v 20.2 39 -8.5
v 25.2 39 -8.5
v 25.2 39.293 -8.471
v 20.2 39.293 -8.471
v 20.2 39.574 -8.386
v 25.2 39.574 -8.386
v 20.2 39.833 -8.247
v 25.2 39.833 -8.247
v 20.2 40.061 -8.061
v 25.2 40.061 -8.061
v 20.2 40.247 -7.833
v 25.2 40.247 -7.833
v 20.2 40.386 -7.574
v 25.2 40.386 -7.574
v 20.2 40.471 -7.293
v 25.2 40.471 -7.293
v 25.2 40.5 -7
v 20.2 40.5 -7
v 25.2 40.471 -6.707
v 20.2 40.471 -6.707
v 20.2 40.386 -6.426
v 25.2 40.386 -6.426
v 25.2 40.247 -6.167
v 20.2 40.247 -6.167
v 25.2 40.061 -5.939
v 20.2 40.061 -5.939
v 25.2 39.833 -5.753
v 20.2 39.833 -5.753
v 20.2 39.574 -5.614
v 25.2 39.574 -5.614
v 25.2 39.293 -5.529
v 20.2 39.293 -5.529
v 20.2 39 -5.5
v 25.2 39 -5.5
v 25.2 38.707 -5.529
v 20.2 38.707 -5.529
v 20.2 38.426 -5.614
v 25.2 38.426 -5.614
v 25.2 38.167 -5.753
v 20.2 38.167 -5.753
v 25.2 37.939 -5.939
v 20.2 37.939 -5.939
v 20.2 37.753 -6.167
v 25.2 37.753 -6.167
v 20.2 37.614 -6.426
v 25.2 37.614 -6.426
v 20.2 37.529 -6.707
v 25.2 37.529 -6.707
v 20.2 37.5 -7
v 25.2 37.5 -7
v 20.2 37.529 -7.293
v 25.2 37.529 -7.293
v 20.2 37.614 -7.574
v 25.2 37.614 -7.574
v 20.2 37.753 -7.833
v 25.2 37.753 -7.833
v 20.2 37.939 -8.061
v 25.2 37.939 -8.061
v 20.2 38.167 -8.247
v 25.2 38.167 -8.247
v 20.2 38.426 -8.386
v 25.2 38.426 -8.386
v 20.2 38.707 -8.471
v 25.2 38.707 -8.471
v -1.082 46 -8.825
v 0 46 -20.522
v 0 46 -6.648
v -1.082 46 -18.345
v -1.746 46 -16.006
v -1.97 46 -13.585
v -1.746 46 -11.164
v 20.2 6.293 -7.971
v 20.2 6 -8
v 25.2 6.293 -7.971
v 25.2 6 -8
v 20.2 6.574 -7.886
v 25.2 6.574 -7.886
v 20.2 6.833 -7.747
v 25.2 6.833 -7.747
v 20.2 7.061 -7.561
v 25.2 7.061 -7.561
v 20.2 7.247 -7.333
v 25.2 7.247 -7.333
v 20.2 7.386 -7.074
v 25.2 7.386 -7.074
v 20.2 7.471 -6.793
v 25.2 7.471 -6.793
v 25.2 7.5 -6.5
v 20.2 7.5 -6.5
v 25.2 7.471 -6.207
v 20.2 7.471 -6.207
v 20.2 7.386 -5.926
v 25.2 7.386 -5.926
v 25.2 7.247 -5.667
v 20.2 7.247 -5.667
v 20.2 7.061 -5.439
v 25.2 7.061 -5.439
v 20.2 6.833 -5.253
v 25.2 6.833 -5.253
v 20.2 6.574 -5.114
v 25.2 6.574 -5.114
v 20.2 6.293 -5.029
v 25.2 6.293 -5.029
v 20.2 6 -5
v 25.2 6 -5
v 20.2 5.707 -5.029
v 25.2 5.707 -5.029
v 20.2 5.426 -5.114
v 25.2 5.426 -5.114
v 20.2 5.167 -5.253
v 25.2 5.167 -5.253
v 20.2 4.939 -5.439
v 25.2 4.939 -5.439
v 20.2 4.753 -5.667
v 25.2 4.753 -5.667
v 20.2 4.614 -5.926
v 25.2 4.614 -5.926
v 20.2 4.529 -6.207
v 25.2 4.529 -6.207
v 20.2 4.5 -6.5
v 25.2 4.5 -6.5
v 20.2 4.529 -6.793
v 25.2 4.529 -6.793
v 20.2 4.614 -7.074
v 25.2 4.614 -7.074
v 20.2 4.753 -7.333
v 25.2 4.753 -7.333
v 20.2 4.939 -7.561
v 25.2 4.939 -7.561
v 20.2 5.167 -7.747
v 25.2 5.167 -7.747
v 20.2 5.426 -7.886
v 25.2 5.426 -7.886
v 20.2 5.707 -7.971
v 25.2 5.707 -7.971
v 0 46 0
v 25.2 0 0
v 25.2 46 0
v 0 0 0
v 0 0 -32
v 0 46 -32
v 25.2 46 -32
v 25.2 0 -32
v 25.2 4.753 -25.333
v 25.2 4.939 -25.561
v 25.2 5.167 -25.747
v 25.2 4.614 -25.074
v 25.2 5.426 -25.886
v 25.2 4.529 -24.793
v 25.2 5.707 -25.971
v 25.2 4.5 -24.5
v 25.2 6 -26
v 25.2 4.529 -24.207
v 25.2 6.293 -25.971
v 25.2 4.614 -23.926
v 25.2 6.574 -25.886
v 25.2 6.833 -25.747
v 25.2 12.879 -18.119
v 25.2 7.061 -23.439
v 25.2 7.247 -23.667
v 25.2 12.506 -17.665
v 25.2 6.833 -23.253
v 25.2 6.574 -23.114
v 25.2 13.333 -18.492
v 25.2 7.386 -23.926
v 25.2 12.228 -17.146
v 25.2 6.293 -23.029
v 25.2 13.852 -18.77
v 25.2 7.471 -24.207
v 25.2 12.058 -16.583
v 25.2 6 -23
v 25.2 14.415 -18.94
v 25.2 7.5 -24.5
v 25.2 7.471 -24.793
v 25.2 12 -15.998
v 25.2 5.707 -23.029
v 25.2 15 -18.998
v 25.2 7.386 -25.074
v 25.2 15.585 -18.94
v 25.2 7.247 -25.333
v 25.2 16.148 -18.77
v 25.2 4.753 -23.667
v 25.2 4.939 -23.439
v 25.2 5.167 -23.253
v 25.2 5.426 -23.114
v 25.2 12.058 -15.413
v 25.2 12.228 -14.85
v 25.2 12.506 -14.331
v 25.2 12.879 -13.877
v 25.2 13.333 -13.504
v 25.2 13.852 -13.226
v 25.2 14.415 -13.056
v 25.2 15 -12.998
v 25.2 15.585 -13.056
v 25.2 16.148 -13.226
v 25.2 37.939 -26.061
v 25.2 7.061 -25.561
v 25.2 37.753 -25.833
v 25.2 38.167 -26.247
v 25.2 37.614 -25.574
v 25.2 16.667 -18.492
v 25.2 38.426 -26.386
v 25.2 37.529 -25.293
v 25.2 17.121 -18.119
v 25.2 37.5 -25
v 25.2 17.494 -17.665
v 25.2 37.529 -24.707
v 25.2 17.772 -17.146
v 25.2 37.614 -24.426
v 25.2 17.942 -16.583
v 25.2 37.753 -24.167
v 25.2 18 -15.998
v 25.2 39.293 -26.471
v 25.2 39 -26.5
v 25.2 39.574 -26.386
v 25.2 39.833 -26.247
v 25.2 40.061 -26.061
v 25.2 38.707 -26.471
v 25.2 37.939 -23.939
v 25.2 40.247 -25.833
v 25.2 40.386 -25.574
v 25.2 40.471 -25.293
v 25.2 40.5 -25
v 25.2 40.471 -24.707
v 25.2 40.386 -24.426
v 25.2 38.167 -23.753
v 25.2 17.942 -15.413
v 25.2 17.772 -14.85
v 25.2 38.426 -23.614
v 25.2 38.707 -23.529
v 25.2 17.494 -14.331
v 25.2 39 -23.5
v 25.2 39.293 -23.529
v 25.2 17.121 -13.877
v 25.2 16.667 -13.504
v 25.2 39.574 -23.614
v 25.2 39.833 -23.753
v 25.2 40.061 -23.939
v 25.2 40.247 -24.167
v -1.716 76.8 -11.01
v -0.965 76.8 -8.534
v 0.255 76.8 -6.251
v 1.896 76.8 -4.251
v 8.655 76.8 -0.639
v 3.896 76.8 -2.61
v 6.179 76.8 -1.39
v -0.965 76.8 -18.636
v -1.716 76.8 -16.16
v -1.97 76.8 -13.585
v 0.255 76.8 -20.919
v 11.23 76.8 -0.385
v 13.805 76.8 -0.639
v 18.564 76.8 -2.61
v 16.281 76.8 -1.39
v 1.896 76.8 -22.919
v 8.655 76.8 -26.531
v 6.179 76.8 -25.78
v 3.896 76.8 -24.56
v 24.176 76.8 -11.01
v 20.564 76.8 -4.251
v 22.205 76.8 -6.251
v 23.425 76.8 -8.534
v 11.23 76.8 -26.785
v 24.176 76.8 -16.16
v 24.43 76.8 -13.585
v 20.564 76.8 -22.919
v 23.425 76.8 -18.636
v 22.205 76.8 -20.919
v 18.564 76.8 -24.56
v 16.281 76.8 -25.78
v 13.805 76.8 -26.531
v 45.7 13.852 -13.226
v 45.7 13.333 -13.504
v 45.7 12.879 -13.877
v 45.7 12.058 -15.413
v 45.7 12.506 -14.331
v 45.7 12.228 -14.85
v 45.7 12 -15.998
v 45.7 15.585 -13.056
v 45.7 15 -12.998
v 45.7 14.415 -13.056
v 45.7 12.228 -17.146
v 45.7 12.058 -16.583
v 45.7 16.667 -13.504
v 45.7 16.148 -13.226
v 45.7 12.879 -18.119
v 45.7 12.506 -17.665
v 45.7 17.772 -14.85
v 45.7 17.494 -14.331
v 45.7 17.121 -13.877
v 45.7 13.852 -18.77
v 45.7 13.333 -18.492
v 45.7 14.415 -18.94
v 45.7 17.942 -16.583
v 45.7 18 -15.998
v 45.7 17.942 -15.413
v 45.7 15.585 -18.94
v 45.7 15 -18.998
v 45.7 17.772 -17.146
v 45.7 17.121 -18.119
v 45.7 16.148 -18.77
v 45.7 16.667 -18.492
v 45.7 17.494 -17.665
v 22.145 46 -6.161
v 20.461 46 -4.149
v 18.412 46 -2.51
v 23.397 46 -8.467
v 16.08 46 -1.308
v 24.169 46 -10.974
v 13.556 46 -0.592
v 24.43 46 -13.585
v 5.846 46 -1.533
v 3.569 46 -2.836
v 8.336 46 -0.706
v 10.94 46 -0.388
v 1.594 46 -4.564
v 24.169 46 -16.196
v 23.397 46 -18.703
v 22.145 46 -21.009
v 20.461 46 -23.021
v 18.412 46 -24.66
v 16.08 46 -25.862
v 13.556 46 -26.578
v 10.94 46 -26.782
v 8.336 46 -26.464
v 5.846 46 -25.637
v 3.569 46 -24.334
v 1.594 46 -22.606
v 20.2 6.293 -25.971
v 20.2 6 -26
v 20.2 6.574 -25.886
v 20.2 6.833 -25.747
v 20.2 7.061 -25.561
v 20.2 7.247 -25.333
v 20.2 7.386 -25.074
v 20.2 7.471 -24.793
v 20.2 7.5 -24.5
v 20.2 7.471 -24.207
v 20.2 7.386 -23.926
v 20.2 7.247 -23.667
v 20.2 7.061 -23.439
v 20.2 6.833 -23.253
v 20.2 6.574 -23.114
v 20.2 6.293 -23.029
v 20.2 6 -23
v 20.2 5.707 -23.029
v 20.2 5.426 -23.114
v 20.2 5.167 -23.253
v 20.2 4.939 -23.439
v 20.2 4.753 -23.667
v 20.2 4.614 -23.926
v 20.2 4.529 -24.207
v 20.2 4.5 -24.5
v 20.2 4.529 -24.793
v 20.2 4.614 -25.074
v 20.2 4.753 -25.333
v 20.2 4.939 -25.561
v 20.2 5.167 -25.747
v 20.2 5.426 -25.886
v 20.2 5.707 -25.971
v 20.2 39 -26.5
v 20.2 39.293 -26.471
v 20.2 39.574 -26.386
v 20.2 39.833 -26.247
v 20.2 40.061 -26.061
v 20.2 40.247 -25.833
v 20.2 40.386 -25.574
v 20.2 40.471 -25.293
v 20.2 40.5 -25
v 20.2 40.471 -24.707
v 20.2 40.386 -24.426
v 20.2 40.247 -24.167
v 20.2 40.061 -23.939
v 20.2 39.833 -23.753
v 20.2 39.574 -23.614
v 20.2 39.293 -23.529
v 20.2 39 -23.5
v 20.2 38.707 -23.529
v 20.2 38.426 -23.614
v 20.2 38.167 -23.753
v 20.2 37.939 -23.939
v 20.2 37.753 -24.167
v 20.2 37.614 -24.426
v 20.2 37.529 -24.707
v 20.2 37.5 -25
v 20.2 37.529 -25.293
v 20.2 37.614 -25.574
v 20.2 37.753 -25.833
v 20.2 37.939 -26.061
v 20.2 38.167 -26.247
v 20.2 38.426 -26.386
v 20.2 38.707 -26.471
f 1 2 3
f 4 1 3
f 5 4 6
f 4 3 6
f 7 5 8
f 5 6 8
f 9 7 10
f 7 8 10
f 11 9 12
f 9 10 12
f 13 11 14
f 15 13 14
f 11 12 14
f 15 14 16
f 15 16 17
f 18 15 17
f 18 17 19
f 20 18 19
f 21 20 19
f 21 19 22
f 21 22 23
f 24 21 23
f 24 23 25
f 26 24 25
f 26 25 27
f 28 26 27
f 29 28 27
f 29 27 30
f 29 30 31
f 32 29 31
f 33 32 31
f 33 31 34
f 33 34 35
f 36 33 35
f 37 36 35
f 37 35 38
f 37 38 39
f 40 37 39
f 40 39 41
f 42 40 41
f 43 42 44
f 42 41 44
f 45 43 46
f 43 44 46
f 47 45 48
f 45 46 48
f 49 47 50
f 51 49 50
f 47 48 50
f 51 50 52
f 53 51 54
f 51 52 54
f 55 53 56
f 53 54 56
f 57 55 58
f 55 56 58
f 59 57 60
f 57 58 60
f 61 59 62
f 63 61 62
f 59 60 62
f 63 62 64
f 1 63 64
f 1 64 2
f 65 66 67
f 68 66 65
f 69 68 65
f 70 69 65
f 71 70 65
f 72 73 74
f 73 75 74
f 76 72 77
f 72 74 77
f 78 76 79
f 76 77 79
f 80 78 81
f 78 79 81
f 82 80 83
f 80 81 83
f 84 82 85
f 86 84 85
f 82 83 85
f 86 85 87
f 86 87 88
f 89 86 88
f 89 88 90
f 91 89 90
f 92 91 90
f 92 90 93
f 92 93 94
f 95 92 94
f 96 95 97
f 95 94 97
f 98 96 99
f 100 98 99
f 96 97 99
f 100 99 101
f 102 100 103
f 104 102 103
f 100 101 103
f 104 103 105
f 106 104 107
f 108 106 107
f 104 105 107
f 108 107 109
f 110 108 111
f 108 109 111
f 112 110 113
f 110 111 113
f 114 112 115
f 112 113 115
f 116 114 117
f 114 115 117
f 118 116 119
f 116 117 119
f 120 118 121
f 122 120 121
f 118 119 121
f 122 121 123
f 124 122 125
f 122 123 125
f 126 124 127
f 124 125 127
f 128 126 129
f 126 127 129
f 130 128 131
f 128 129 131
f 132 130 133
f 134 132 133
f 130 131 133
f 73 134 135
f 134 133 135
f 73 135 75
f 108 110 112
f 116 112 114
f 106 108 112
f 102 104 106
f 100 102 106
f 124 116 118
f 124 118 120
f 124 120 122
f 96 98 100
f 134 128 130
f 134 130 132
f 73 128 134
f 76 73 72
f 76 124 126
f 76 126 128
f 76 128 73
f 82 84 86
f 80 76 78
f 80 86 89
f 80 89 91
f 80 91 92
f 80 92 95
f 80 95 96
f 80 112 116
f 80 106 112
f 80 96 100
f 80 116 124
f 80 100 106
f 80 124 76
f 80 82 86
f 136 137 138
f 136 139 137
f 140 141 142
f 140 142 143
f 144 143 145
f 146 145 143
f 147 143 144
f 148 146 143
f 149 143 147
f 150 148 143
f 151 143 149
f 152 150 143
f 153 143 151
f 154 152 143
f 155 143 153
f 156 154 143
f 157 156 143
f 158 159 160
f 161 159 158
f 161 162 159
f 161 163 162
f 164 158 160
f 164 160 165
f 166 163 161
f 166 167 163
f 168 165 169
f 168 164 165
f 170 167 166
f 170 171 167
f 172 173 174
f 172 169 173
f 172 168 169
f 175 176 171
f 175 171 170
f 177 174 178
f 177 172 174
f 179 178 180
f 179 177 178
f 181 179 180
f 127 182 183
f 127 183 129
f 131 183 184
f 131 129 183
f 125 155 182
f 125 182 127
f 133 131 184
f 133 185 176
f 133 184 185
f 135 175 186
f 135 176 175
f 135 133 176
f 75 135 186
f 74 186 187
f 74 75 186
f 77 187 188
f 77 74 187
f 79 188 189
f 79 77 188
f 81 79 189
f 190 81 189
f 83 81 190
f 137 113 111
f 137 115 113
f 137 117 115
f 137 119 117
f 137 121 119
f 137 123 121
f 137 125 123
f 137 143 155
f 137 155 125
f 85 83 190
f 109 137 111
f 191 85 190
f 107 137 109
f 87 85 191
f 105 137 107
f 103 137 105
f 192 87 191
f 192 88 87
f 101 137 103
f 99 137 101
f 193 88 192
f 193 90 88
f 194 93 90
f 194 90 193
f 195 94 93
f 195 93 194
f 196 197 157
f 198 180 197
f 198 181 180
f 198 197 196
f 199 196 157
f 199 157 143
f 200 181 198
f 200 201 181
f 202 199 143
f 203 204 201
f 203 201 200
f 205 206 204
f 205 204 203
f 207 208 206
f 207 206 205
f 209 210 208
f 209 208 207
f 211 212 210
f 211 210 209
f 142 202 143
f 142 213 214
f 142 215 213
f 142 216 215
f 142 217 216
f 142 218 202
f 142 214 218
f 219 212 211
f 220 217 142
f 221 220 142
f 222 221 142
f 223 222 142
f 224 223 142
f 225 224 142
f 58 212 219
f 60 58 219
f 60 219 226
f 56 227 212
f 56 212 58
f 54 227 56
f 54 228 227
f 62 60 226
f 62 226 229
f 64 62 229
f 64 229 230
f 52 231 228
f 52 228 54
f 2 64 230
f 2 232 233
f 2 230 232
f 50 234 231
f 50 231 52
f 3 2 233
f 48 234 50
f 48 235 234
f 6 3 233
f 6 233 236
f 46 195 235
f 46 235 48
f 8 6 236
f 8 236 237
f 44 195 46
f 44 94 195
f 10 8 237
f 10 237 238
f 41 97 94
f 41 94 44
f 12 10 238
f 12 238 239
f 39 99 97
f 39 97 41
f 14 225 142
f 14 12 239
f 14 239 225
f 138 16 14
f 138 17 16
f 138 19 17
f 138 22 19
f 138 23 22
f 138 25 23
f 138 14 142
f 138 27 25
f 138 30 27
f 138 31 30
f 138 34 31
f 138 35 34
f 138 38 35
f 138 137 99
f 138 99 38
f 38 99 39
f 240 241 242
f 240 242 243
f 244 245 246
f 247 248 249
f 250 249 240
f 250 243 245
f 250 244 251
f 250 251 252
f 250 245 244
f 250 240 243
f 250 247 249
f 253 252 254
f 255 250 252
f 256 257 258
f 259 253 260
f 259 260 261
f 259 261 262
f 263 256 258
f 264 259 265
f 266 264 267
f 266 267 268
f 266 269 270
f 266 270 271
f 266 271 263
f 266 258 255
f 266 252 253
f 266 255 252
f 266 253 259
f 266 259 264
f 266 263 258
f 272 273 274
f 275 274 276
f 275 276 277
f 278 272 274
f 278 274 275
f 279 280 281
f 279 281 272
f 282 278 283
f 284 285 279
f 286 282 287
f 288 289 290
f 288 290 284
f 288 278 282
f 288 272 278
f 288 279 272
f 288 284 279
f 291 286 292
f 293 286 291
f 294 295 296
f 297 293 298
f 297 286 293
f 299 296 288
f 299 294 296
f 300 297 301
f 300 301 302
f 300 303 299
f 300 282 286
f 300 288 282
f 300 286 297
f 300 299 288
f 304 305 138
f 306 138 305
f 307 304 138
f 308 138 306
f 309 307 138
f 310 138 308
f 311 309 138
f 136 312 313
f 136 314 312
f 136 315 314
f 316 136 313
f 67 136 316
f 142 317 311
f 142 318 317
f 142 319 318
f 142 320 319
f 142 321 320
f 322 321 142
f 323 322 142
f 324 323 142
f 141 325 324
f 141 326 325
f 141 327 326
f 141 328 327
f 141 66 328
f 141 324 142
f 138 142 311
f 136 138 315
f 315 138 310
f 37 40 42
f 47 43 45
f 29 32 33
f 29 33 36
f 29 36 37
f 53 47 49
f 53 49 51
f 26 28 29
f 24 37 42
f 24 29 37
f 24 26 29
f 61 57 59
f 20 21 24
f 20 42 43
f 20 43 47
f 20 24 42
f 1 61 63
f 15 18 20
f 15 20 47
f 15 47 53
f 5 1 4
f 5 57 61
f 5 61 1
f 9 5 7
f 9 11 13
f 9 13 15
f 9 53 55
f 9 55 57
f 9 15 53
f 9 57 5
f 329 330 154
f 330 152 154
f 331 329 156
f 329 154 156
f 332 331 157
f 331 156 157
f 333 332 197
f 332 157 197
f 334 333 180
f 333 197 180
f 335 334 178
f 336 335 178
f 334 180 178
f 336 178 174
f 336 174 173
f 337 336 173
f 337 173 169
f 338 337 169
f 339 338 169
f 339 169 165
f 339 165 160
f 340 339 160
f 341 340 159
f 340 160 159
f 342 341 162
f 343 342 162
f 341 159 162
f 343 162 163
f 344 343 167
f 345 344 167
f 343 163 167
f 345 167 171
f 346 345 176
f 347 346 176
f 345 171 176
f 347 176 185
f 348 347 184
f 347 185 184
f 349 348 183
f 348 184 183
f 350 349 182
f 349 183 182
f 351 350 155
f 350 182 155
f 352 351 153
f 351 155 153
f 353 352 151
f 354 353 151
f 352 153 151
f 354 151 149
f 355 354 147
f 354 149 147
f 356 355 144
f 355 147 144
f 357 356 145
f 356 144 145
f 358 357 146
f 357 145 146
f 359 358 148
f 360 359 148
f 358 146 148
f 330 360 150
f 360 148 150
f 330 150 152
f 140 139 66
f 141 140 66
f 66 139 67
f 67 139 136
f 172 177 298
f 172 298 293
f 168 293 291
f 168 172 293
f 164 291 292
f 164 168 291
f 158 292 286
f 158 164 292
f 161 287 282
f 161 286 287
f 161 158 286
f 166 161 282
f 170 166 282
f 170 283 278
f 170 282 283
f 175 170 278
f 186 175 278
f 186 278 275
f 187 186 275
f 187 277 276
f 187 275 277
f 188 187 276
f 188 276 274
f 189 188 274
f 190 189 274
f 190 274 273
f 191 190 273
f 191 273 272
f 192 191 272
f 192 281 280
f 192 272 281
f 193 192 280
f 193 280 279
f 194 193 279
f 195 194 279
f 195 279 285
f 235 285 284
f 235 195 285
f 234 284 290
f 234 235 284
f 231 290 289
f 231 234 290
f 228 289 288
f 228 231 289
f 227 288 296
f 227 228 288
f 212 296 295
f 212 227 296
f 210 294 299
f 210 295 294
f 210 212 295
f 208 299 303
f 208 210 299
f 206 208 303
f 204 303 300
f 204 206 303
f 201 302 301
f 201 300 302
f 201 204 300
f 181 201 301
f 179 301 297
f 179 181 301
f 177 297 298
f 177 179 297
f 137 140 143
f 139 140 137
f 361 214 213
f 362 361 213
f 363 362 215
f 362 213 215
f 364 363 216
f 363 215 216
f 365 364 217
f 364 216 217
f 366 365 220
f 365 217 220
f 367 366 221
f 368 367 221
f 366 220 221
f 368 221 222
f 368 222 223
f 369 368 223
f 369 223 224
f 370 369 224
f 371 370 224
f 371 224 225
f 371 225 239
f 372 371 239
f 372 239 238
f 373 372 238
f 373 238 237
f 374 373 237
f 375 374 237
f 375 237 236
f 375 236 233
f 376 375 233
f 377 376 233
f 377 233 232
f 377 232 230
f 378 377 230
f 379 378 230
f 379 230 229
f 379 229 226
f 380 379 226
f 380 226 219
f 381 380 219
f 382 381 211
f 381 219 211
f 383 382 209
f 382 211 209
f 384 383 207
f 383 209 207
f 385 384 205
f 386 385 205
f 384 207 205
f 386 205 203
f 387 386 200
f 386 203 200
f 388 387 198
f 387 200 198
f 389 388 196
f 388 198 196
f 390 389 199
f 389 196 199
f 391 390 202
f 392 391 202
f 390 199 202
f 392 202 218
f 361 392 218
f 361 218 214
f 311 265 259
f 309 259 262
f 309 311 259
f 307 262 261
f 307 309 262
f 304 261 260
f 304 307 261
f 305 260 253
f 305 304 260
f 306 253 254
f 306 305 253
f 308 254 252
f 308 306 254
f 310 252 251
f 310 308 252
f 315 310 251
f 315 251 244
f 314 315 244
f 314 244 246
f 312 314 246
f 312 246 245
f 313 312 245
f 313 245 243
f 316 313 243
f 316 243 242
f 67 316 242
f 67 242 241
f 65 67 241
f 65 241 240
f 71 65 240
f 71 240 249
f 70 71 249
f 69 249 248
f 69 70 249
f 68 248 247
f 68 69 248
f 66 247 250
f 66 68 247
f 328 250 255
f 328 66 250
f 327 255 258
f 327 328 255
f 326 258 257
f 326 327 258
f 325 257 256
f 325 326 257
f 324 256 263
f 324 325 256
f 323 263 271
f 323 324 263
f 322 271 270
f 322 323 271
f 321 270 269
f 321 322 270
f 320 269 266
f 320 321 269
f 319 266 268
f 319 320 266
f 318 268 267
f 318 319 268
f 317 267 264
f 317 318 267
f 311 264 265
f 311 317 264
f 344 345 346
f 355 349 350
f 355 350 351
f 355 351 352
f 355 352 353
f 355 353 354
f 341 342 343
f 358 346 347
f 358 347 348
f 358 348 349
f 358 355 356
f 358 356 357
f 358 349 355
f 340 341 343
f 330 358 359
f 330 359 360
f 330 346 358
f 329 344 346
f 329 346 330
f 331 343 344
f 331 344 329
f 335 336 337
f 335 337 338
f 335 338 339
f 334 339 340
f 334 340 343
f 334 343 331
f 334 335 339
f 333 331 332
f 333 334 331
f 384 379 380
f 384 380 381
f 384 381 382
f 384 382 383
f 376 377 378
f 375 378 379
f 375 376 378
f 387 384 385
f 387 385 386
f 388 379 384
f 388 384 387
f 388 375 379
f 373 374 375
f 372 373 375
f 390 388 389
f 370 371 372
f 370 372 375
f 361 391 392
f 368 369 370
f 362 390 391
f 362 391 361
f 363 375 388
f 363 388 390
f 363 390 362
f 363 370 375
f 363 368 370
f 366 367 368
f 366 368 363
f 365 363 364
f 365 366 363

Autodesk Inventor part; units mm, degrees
ref_plane "YZ Plane" through (0, 0, 0) normal (1, 0, 0) x (0, 1, 0)
ref_plane "XZ Plane" through (0, 0, 0) normal (0, 1, 0) x (-1, 0, 0)
ref_plane "XY Plane" through (0, 0, 0) normal (0, 0, 1) x (1, 0, 0)
sketch "Sketch1" plane through (0, 0, 0) normal (1, 0, 0) x (0, 1, 0)
  line L0 (0, 0) -> (46, 0)
  line L1 (46, 0) -> (46, -32)
  line L2 (46, -32) -> (0, -32)
  line L3 (0, -32) -> (0, 0)
  dimension "d0" = 46
  dimension "d1" = 32
extrude "Extrusion1" add sketch "Sketch1" along normal blind 25.2
sketch "Sketch3" plane through (0, 46, 0) normal (0, 1, 0) x (1, 0, 0)
  circle A0 centre (11.23, 13.585) radius 13.2
  line L0 (25.2, 32) -> (25.2, 0) projected
  line L1 (0, 32) -> (25.2, 32) projected
  point P0 (0, 0)
  dimension "d4" = 26.4
  dimension "d5" = 13.97
  dimension "d6" = 18.415
extrude "Extrusion2" add sketch "Sketch3" along normal blind 30.8
sketch "Sketch4" plane through (25.2, 0, 0) normal (1, 0, 0) x (0, 0, -1)
  circle A0 centre (7, 39) radius 1.5
  circle A1 centre (25, 39) radius 1.5
  circle A2 centre (6.5, 6) radius 1.5
  circle A3 centre (24.5, 6) radius 1.5
  line L0 (32, 46) -> (0, 46) projected
  line L1 (32, 0) -> (32, 46) projected
  point P0 (0, 0)
  dimension "d9" = 3
  dimension "d10" = 3
  dimension "d11" = 3
  dimension "d12" = 3
  dimension "d13" = 7
  dimension "d14" = 7
  dimension "d15" = 18
  dimension "d16" = 33
  dimension "d17" = 33
  dimension "d18" = 18
  dimension "d19" = 7
  dimension "d20" = 7.5
extrude "Extrusion3" cut sketch "Sketch4" against normal blind 5
sketch "Sketch5" plane through (25.2, 0, 0) normal (1, 0, 0) x (0, 0, -1)
  circle A0 centre (15.998, 15) radius 3
  line L0 (32, 0) -> (32, 46) projected
  line L1 (0, 0) -> (32, 0) projected
  dimension "d23" = 6
  dimension "d24" = 16.002
  dimension "d25" = 15
extrude "Extrusion4" add sketch "Sketch5" along normal blind 20.5
properties part number "motor"
